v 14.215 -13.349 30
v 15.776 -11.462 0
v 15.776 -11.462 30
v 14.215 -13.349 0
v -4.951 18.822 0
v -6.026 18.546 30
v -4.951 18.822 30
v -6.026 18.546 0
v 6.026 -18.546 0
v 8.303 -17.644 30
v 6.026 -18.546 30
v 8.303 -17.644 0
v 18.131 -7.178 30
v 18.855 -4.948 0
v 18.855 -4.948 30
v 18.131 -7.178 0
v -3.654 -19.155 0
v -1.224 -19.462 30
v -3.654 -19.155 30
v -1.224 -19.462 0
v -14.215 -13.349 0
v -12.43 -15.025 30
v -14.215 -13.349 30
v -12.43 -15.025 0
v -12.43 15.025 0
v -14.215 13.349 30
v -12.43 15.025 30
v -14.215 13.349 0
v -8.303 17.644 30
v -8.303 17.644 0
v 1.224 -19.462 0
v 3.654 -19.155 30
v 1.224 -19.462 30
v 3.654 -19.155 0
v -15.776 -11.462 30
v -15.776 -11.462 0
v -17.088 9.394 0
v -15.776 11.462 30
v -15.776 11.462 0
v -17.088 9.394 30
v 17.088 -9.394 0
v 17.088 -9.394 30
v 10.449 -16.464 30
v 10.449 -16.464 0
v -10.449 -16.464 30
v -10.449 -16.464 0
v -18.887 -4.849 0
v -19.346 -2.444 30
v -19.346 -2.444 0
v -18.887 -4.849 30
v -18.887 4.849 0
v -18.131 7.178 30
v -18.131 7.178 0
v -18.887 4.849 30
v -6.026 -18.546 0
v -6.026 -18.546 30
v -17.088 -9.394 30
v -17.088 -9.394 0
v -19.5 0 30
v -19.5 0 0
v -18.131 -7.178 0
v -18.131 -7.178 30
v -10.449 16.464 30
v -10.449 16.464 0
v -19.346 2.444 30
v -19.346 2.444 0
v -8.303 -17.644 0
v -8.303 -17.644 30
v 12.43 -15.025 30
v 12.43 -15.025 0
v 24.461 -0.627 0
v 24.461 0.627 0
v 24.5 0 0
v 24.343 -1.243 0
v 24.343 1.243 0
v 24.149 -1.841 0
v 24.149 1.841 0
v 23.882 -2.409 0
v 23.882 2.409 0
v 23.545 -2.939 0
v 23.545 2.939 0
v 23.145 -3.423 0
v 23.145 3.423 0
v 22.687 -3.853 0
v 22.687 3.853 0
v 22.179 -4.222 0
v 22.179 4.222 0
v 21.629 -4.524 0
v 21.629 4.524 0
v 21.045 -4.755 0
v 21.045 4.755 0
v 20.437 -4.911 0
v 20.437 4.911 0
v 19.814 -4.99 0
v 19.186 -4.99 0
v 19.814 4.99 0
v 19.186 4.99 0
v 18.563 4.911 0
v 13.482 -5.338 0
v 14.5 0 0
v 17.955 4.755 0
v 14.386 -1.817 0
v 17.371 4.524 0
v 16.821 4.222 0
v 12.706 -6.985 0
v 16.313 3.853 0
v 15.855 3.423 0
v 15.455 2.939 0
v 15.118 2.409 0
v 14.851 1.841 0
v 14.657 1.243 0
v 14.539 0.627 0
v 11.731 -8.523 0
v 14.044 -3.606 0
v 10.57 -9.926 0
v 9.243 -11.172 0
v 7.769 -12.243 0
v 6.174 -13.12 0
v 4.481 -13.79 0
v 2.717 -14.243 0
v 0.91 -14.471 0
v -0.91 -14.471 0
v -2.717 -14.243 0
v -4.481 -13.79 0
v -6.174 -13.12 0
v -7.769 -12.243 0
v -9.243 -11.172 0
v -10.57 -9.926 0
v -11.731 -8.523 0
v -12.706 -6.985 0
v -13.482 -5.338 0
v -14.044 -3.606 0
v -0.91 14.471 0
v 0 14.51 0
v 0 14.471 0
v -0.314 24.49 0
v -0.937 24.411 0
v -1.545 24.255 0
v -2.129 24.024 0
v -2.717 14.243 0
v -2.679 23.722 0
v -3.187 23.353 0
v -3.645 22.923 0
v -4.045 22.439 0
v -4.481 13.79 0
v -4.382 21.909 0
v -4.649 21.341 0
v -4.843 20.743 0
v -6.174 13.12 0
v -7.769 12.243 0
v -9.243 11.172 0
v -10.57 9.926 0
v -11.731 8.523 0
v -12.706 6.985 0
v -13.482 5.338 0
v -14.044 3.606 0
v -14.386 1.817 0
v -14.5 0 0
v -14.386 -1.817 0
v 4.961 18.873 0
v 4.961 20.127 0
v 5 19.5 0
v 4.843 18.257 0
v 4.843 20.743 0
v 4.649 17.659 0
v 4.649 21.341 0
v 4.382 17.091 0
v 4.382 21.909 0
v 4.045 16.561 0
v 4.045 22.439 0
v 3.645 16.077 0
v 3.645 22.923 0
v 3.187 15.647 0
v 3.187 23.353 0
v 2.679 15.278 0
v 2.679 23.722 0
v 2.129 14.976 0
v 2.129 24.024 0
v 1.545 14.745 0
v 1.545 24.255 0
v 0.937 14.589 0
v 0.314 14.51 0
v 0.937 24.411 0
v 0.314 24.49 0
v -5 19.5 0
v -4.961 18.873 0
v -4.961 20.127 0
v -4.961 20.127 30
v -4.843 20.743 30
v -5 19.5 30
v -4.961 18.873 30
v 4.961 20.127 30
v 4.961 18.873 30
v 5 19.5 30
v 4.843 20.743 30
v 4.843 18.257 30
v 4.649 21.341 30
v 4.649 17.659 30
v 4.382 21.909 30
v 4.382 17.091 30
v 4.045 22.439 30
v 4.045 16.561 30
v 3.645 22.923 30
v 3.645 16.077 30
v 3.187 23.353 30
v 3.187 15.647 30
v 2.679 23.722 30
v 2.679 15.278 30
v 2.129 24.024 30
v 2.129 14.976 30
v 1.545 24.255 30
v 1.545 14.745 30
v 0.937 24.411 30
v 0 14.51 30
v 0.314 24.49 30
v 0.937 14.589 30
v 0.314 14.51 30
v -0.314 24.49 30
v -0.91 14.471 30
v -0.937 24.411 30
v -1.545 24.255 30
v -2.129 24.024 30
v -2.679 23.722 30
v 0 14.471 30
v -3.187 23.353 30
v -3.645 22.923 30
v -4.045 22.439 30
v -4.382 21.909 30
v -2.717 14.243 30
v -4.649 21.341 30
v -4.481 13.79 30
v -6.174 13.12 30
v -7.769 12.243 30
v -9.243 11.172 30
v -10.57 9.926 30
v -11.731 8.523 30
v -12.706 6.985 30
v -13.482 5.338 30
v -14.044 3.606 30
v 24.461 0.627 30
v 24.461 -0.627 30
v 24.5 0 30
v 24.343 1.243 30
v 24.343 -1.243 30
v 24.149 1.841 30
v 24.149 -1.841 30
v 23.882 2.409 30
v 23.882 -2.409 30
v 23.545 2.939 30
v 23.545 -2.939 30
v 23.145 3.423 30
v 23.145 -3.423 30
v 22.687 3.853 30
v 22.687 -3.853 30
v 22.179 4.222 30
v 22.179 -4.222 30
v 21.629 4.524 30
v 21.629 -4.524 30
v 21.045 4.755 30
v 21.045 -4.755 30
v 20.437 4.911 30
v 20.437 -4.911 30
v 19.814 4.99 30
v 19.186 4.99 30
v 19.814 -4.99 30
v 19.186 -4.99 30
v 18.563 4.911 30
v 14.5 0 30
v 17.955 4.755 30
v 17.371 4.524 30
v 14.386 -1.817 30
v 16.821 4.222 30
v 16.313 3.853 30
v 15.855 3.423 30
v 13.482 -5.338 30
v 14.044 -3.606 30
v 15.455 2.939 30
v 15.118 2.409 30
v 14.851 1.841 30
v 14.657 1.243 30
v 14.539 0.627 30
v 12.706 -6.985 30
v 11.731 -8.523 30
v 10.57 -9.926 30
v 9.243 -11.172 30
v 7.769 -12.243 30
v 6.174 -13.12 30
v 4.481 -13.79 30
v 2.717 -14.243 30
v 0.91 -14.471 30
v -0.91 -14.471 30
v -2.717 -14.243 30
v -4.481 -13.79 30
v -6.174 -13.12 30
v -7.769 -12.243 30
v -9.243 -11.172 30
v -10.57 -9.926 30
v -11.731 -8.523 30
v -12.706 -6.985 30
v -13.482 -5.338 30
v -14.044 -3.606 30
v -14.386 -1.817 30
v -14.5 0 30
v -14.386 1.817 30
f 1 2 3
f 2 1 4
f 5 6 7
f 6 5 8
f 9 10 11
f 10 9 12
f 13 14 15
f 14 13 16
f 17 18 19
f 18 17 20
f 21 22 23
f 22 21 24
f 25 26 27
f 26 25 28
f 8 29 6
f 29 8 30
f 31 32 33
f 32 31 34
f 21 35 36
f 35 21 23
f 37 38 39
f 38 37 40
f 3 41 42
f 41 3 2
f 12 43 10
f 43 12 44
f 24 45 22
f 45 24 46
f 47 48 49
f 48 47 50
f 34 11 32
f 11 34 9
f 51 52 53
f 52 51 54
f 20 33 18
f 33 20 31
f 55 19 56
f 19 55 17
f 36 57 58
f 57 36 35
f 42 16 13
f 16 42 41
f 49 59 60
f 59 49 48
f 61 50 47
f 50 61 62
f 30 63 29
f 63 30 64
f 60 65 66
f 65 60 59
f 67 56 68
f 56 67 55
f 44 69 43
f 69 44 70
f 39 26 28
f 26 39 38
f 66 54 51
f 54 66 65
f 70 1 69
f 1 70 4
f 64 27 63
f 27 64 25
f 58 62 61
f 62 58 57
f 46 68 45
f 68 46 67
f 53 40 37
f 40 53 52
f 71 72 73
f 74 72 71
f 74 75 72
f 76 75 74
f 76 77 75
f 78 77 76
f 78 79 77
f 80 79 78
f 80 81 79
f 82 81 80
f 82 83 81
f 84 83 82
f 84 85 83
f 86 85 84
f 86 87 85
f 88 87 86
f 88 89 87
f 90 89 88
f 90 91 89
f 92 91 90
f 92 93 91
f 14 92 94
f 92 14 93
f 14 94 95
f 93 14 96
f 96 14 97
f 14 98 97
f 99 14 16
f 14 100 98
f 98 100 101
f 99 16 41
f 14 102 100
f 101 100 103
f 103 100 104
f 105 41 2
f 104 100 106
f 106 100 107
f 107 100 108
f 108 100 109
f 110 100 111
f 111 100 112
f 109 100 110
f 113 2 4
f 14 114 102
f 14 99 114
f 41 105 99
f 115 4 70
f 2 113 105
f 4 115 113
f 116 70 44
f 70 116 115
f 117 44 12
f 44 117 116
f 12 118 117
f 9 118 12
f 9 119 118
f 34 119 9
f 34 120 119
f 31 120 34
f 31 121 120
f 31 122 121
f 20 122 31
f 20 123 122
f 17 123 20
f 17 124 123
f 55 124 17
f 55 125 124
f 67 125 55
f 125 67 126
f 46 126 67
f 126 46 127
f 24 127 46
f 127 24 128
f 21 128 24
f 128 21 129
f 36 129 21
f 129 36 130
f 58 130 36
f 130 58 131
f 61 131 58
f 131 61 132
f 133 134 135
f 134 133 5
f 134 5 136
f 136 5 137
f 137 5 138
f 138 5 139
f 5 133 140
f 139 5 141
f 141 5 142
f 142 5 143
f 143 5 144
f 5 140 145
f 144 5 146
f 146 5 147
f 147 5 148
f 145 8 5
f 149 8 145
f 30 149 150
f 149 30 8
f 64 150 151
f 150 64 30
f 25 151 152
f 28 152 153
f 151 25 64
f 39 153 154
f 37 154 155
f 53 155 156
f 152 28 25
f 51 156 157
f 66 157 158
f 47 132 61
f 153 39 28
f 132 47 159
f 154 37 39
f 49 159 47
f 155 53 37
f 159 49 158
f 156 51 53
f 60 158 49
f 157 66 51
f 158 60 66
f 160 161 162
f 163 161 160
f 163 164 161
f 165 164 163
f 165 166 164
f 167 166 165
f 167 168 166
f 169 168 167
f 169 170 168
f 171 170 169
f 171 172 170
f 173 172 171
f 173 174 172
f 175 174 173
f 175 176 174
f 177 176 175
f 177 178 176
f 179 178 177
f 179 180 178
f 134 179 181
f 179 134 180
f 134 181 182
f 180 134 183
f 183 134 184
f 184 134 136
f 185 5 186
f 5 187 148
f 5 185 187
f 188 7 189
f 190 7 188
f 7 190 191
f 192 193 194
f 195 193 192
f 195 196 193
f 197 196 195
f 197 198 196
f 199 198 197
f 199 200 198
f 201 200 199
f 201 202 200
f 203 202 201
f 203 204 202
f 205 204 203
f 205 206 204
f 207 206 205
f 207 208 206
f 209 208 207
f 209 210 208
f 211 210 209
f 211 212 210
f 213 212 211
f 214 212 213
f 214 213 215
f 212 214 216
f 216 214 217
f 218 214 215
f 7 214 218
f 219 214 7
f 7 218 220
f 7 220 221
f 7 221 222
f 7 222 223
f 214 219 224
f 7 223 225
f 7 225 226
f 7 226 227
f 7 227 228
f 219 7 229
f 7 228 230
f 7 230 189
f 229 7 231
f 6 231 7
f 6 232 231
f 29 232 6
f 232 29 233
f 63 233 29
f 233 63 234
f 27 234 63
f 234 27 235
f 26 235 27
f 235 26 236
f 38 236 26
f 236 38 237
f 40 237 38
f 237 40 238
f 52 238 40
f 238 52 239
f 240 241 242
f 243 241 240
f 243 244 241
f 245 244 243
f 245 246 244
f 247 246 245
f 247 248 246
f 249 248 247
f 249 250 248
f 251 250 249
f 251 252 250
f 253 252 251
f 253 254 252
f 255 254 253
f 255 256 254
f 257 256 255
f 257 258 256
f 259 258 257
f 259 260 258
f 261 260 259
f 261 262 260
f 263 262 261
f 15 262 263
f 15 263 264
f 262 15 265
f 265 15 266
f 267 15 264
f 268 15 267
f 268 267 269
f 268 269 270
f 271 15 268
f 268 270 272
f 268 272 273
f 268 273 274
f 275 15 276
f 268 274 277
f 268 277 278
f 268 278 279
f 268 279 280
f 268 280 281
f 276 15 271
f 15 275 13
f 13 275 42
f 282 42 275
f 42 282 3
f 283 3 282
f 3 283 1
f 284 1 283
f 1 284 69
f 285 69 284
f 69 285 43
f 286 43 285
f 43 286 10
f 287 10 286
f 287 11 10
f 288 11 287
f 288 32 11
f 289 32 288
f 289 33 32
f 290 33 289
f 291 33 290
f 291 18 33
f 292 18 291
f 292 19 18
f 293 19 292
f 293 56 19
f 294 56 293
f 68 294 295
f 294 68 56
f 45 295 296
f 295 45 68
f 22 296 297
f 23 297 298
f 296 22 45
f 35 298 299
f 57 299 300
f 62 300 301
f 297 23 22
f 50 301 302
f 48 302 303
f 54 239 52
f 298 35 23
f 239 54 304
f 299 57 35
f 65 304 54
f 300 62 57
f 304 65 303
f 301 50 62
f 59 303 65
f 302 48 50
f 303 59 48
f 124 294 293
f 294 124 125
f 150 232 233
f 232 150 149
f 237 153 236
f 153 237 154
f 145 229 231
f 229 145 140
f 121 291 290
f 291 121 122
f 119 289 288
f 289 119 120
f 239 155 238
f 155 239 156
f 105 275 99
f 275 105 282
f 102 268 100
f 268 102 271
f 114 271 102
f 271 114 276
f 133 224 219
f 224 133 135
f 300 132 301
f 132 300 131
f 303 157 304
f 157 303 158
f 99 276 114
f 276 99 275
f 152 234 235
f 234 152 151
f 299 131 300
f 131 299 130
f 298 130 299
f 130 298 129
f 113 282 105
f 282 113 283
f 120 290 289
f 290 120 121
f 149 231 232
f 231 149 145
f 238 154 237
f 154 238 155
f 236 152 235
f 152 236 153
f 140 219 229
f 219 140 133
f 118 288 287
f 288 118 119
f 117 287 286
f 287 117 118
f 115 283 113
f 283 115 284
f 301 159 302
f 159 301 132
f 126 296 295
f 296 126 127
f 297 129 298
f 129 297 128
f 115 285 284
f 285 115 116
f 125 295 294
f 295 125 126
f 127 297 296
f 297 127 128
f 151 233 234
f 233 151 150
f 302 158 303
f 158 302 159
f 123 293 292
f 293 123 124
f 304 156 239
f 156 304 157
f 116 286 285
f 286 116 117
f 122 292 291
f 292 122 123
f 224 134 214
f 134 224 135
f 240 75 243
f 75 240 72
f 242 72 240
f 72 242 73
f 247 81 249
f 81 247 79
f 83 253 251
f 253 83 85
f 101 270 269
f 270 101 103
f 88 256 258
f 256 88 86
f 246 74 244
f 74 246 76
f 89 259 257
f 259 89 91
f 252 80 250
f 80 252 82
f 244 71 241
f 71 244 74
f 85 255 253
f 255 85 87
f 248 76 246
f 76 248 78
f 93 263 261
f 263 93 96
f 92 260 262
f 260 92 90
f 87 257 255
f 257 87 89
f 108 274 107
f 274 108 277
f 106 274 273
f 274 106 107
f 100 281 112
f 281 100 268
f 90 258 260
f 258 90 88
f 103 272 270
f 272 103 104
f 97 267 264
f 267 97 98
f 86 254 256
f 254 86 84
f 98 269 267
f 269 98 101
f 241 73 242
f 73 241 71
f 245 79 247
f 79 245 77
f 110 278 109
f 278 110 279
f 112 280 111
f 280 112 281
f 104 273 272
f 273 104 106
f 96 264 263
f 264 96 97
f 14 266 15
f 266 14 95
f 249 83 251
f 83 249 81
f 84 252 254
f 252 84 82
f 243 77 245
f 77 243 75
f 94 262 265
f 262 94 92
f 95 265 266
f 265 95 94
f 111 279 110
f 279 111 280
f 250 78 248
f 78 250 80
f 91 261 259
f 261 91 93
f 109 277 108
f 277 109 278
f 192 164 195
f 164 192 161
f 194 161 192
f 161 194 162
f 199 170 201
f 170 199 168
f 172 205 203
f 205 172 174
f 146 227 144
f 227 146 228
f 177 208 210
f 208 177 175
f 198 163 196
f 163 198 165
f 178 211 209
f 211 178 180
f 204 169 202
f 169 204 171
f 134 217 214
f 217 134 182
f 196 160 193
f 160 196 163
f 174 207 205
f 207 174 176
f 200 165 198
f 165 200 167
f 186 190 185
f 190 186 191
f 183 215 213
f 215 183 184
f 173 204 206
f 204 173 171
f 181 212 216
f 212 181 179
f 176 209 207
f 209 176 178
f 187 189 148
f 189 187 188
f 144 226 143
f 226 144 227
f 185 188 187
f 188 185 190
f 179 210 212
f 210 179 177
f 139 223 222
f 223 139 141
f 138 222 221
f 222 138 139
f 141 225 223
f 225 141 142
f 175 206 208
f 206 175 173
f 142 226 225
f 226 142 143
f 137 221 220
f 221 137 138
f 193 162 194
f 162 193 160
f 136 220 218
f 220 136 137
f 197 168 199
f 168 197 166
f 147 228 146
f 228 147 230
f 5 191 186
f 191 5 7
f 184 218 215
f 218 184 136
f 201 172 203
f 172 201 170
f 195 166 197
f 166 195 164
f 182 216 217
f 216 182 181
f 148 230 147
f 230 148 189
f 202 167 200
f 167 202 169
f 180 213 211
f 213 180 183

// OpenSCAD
//Clip Height
height=30;
//Cylinder diameter
diameter=29;
//Clip Thickness
thickness=5;
//Roundness
$fn=50;

difference(){
    cylinder(d=diameter+(thickness*2),h=height);
    translate([0,0,-1]){cylinder(d=diameter,h=height+2);}
    translate([0,0,-1])cube([diameter+(thickness*2),diameter+(thickness*2),height+2]);
}
translate([(diameter+(thickness*2))/2,0,0])cylinder(d=thickness*2,h=height);
translate([0,(diameter+(thickness*2))/2,0])cylinder(d=thickness*2,h=height);

//color("grey")translate([0,0,-5])cylinder(d=diameter,h=height+10);
